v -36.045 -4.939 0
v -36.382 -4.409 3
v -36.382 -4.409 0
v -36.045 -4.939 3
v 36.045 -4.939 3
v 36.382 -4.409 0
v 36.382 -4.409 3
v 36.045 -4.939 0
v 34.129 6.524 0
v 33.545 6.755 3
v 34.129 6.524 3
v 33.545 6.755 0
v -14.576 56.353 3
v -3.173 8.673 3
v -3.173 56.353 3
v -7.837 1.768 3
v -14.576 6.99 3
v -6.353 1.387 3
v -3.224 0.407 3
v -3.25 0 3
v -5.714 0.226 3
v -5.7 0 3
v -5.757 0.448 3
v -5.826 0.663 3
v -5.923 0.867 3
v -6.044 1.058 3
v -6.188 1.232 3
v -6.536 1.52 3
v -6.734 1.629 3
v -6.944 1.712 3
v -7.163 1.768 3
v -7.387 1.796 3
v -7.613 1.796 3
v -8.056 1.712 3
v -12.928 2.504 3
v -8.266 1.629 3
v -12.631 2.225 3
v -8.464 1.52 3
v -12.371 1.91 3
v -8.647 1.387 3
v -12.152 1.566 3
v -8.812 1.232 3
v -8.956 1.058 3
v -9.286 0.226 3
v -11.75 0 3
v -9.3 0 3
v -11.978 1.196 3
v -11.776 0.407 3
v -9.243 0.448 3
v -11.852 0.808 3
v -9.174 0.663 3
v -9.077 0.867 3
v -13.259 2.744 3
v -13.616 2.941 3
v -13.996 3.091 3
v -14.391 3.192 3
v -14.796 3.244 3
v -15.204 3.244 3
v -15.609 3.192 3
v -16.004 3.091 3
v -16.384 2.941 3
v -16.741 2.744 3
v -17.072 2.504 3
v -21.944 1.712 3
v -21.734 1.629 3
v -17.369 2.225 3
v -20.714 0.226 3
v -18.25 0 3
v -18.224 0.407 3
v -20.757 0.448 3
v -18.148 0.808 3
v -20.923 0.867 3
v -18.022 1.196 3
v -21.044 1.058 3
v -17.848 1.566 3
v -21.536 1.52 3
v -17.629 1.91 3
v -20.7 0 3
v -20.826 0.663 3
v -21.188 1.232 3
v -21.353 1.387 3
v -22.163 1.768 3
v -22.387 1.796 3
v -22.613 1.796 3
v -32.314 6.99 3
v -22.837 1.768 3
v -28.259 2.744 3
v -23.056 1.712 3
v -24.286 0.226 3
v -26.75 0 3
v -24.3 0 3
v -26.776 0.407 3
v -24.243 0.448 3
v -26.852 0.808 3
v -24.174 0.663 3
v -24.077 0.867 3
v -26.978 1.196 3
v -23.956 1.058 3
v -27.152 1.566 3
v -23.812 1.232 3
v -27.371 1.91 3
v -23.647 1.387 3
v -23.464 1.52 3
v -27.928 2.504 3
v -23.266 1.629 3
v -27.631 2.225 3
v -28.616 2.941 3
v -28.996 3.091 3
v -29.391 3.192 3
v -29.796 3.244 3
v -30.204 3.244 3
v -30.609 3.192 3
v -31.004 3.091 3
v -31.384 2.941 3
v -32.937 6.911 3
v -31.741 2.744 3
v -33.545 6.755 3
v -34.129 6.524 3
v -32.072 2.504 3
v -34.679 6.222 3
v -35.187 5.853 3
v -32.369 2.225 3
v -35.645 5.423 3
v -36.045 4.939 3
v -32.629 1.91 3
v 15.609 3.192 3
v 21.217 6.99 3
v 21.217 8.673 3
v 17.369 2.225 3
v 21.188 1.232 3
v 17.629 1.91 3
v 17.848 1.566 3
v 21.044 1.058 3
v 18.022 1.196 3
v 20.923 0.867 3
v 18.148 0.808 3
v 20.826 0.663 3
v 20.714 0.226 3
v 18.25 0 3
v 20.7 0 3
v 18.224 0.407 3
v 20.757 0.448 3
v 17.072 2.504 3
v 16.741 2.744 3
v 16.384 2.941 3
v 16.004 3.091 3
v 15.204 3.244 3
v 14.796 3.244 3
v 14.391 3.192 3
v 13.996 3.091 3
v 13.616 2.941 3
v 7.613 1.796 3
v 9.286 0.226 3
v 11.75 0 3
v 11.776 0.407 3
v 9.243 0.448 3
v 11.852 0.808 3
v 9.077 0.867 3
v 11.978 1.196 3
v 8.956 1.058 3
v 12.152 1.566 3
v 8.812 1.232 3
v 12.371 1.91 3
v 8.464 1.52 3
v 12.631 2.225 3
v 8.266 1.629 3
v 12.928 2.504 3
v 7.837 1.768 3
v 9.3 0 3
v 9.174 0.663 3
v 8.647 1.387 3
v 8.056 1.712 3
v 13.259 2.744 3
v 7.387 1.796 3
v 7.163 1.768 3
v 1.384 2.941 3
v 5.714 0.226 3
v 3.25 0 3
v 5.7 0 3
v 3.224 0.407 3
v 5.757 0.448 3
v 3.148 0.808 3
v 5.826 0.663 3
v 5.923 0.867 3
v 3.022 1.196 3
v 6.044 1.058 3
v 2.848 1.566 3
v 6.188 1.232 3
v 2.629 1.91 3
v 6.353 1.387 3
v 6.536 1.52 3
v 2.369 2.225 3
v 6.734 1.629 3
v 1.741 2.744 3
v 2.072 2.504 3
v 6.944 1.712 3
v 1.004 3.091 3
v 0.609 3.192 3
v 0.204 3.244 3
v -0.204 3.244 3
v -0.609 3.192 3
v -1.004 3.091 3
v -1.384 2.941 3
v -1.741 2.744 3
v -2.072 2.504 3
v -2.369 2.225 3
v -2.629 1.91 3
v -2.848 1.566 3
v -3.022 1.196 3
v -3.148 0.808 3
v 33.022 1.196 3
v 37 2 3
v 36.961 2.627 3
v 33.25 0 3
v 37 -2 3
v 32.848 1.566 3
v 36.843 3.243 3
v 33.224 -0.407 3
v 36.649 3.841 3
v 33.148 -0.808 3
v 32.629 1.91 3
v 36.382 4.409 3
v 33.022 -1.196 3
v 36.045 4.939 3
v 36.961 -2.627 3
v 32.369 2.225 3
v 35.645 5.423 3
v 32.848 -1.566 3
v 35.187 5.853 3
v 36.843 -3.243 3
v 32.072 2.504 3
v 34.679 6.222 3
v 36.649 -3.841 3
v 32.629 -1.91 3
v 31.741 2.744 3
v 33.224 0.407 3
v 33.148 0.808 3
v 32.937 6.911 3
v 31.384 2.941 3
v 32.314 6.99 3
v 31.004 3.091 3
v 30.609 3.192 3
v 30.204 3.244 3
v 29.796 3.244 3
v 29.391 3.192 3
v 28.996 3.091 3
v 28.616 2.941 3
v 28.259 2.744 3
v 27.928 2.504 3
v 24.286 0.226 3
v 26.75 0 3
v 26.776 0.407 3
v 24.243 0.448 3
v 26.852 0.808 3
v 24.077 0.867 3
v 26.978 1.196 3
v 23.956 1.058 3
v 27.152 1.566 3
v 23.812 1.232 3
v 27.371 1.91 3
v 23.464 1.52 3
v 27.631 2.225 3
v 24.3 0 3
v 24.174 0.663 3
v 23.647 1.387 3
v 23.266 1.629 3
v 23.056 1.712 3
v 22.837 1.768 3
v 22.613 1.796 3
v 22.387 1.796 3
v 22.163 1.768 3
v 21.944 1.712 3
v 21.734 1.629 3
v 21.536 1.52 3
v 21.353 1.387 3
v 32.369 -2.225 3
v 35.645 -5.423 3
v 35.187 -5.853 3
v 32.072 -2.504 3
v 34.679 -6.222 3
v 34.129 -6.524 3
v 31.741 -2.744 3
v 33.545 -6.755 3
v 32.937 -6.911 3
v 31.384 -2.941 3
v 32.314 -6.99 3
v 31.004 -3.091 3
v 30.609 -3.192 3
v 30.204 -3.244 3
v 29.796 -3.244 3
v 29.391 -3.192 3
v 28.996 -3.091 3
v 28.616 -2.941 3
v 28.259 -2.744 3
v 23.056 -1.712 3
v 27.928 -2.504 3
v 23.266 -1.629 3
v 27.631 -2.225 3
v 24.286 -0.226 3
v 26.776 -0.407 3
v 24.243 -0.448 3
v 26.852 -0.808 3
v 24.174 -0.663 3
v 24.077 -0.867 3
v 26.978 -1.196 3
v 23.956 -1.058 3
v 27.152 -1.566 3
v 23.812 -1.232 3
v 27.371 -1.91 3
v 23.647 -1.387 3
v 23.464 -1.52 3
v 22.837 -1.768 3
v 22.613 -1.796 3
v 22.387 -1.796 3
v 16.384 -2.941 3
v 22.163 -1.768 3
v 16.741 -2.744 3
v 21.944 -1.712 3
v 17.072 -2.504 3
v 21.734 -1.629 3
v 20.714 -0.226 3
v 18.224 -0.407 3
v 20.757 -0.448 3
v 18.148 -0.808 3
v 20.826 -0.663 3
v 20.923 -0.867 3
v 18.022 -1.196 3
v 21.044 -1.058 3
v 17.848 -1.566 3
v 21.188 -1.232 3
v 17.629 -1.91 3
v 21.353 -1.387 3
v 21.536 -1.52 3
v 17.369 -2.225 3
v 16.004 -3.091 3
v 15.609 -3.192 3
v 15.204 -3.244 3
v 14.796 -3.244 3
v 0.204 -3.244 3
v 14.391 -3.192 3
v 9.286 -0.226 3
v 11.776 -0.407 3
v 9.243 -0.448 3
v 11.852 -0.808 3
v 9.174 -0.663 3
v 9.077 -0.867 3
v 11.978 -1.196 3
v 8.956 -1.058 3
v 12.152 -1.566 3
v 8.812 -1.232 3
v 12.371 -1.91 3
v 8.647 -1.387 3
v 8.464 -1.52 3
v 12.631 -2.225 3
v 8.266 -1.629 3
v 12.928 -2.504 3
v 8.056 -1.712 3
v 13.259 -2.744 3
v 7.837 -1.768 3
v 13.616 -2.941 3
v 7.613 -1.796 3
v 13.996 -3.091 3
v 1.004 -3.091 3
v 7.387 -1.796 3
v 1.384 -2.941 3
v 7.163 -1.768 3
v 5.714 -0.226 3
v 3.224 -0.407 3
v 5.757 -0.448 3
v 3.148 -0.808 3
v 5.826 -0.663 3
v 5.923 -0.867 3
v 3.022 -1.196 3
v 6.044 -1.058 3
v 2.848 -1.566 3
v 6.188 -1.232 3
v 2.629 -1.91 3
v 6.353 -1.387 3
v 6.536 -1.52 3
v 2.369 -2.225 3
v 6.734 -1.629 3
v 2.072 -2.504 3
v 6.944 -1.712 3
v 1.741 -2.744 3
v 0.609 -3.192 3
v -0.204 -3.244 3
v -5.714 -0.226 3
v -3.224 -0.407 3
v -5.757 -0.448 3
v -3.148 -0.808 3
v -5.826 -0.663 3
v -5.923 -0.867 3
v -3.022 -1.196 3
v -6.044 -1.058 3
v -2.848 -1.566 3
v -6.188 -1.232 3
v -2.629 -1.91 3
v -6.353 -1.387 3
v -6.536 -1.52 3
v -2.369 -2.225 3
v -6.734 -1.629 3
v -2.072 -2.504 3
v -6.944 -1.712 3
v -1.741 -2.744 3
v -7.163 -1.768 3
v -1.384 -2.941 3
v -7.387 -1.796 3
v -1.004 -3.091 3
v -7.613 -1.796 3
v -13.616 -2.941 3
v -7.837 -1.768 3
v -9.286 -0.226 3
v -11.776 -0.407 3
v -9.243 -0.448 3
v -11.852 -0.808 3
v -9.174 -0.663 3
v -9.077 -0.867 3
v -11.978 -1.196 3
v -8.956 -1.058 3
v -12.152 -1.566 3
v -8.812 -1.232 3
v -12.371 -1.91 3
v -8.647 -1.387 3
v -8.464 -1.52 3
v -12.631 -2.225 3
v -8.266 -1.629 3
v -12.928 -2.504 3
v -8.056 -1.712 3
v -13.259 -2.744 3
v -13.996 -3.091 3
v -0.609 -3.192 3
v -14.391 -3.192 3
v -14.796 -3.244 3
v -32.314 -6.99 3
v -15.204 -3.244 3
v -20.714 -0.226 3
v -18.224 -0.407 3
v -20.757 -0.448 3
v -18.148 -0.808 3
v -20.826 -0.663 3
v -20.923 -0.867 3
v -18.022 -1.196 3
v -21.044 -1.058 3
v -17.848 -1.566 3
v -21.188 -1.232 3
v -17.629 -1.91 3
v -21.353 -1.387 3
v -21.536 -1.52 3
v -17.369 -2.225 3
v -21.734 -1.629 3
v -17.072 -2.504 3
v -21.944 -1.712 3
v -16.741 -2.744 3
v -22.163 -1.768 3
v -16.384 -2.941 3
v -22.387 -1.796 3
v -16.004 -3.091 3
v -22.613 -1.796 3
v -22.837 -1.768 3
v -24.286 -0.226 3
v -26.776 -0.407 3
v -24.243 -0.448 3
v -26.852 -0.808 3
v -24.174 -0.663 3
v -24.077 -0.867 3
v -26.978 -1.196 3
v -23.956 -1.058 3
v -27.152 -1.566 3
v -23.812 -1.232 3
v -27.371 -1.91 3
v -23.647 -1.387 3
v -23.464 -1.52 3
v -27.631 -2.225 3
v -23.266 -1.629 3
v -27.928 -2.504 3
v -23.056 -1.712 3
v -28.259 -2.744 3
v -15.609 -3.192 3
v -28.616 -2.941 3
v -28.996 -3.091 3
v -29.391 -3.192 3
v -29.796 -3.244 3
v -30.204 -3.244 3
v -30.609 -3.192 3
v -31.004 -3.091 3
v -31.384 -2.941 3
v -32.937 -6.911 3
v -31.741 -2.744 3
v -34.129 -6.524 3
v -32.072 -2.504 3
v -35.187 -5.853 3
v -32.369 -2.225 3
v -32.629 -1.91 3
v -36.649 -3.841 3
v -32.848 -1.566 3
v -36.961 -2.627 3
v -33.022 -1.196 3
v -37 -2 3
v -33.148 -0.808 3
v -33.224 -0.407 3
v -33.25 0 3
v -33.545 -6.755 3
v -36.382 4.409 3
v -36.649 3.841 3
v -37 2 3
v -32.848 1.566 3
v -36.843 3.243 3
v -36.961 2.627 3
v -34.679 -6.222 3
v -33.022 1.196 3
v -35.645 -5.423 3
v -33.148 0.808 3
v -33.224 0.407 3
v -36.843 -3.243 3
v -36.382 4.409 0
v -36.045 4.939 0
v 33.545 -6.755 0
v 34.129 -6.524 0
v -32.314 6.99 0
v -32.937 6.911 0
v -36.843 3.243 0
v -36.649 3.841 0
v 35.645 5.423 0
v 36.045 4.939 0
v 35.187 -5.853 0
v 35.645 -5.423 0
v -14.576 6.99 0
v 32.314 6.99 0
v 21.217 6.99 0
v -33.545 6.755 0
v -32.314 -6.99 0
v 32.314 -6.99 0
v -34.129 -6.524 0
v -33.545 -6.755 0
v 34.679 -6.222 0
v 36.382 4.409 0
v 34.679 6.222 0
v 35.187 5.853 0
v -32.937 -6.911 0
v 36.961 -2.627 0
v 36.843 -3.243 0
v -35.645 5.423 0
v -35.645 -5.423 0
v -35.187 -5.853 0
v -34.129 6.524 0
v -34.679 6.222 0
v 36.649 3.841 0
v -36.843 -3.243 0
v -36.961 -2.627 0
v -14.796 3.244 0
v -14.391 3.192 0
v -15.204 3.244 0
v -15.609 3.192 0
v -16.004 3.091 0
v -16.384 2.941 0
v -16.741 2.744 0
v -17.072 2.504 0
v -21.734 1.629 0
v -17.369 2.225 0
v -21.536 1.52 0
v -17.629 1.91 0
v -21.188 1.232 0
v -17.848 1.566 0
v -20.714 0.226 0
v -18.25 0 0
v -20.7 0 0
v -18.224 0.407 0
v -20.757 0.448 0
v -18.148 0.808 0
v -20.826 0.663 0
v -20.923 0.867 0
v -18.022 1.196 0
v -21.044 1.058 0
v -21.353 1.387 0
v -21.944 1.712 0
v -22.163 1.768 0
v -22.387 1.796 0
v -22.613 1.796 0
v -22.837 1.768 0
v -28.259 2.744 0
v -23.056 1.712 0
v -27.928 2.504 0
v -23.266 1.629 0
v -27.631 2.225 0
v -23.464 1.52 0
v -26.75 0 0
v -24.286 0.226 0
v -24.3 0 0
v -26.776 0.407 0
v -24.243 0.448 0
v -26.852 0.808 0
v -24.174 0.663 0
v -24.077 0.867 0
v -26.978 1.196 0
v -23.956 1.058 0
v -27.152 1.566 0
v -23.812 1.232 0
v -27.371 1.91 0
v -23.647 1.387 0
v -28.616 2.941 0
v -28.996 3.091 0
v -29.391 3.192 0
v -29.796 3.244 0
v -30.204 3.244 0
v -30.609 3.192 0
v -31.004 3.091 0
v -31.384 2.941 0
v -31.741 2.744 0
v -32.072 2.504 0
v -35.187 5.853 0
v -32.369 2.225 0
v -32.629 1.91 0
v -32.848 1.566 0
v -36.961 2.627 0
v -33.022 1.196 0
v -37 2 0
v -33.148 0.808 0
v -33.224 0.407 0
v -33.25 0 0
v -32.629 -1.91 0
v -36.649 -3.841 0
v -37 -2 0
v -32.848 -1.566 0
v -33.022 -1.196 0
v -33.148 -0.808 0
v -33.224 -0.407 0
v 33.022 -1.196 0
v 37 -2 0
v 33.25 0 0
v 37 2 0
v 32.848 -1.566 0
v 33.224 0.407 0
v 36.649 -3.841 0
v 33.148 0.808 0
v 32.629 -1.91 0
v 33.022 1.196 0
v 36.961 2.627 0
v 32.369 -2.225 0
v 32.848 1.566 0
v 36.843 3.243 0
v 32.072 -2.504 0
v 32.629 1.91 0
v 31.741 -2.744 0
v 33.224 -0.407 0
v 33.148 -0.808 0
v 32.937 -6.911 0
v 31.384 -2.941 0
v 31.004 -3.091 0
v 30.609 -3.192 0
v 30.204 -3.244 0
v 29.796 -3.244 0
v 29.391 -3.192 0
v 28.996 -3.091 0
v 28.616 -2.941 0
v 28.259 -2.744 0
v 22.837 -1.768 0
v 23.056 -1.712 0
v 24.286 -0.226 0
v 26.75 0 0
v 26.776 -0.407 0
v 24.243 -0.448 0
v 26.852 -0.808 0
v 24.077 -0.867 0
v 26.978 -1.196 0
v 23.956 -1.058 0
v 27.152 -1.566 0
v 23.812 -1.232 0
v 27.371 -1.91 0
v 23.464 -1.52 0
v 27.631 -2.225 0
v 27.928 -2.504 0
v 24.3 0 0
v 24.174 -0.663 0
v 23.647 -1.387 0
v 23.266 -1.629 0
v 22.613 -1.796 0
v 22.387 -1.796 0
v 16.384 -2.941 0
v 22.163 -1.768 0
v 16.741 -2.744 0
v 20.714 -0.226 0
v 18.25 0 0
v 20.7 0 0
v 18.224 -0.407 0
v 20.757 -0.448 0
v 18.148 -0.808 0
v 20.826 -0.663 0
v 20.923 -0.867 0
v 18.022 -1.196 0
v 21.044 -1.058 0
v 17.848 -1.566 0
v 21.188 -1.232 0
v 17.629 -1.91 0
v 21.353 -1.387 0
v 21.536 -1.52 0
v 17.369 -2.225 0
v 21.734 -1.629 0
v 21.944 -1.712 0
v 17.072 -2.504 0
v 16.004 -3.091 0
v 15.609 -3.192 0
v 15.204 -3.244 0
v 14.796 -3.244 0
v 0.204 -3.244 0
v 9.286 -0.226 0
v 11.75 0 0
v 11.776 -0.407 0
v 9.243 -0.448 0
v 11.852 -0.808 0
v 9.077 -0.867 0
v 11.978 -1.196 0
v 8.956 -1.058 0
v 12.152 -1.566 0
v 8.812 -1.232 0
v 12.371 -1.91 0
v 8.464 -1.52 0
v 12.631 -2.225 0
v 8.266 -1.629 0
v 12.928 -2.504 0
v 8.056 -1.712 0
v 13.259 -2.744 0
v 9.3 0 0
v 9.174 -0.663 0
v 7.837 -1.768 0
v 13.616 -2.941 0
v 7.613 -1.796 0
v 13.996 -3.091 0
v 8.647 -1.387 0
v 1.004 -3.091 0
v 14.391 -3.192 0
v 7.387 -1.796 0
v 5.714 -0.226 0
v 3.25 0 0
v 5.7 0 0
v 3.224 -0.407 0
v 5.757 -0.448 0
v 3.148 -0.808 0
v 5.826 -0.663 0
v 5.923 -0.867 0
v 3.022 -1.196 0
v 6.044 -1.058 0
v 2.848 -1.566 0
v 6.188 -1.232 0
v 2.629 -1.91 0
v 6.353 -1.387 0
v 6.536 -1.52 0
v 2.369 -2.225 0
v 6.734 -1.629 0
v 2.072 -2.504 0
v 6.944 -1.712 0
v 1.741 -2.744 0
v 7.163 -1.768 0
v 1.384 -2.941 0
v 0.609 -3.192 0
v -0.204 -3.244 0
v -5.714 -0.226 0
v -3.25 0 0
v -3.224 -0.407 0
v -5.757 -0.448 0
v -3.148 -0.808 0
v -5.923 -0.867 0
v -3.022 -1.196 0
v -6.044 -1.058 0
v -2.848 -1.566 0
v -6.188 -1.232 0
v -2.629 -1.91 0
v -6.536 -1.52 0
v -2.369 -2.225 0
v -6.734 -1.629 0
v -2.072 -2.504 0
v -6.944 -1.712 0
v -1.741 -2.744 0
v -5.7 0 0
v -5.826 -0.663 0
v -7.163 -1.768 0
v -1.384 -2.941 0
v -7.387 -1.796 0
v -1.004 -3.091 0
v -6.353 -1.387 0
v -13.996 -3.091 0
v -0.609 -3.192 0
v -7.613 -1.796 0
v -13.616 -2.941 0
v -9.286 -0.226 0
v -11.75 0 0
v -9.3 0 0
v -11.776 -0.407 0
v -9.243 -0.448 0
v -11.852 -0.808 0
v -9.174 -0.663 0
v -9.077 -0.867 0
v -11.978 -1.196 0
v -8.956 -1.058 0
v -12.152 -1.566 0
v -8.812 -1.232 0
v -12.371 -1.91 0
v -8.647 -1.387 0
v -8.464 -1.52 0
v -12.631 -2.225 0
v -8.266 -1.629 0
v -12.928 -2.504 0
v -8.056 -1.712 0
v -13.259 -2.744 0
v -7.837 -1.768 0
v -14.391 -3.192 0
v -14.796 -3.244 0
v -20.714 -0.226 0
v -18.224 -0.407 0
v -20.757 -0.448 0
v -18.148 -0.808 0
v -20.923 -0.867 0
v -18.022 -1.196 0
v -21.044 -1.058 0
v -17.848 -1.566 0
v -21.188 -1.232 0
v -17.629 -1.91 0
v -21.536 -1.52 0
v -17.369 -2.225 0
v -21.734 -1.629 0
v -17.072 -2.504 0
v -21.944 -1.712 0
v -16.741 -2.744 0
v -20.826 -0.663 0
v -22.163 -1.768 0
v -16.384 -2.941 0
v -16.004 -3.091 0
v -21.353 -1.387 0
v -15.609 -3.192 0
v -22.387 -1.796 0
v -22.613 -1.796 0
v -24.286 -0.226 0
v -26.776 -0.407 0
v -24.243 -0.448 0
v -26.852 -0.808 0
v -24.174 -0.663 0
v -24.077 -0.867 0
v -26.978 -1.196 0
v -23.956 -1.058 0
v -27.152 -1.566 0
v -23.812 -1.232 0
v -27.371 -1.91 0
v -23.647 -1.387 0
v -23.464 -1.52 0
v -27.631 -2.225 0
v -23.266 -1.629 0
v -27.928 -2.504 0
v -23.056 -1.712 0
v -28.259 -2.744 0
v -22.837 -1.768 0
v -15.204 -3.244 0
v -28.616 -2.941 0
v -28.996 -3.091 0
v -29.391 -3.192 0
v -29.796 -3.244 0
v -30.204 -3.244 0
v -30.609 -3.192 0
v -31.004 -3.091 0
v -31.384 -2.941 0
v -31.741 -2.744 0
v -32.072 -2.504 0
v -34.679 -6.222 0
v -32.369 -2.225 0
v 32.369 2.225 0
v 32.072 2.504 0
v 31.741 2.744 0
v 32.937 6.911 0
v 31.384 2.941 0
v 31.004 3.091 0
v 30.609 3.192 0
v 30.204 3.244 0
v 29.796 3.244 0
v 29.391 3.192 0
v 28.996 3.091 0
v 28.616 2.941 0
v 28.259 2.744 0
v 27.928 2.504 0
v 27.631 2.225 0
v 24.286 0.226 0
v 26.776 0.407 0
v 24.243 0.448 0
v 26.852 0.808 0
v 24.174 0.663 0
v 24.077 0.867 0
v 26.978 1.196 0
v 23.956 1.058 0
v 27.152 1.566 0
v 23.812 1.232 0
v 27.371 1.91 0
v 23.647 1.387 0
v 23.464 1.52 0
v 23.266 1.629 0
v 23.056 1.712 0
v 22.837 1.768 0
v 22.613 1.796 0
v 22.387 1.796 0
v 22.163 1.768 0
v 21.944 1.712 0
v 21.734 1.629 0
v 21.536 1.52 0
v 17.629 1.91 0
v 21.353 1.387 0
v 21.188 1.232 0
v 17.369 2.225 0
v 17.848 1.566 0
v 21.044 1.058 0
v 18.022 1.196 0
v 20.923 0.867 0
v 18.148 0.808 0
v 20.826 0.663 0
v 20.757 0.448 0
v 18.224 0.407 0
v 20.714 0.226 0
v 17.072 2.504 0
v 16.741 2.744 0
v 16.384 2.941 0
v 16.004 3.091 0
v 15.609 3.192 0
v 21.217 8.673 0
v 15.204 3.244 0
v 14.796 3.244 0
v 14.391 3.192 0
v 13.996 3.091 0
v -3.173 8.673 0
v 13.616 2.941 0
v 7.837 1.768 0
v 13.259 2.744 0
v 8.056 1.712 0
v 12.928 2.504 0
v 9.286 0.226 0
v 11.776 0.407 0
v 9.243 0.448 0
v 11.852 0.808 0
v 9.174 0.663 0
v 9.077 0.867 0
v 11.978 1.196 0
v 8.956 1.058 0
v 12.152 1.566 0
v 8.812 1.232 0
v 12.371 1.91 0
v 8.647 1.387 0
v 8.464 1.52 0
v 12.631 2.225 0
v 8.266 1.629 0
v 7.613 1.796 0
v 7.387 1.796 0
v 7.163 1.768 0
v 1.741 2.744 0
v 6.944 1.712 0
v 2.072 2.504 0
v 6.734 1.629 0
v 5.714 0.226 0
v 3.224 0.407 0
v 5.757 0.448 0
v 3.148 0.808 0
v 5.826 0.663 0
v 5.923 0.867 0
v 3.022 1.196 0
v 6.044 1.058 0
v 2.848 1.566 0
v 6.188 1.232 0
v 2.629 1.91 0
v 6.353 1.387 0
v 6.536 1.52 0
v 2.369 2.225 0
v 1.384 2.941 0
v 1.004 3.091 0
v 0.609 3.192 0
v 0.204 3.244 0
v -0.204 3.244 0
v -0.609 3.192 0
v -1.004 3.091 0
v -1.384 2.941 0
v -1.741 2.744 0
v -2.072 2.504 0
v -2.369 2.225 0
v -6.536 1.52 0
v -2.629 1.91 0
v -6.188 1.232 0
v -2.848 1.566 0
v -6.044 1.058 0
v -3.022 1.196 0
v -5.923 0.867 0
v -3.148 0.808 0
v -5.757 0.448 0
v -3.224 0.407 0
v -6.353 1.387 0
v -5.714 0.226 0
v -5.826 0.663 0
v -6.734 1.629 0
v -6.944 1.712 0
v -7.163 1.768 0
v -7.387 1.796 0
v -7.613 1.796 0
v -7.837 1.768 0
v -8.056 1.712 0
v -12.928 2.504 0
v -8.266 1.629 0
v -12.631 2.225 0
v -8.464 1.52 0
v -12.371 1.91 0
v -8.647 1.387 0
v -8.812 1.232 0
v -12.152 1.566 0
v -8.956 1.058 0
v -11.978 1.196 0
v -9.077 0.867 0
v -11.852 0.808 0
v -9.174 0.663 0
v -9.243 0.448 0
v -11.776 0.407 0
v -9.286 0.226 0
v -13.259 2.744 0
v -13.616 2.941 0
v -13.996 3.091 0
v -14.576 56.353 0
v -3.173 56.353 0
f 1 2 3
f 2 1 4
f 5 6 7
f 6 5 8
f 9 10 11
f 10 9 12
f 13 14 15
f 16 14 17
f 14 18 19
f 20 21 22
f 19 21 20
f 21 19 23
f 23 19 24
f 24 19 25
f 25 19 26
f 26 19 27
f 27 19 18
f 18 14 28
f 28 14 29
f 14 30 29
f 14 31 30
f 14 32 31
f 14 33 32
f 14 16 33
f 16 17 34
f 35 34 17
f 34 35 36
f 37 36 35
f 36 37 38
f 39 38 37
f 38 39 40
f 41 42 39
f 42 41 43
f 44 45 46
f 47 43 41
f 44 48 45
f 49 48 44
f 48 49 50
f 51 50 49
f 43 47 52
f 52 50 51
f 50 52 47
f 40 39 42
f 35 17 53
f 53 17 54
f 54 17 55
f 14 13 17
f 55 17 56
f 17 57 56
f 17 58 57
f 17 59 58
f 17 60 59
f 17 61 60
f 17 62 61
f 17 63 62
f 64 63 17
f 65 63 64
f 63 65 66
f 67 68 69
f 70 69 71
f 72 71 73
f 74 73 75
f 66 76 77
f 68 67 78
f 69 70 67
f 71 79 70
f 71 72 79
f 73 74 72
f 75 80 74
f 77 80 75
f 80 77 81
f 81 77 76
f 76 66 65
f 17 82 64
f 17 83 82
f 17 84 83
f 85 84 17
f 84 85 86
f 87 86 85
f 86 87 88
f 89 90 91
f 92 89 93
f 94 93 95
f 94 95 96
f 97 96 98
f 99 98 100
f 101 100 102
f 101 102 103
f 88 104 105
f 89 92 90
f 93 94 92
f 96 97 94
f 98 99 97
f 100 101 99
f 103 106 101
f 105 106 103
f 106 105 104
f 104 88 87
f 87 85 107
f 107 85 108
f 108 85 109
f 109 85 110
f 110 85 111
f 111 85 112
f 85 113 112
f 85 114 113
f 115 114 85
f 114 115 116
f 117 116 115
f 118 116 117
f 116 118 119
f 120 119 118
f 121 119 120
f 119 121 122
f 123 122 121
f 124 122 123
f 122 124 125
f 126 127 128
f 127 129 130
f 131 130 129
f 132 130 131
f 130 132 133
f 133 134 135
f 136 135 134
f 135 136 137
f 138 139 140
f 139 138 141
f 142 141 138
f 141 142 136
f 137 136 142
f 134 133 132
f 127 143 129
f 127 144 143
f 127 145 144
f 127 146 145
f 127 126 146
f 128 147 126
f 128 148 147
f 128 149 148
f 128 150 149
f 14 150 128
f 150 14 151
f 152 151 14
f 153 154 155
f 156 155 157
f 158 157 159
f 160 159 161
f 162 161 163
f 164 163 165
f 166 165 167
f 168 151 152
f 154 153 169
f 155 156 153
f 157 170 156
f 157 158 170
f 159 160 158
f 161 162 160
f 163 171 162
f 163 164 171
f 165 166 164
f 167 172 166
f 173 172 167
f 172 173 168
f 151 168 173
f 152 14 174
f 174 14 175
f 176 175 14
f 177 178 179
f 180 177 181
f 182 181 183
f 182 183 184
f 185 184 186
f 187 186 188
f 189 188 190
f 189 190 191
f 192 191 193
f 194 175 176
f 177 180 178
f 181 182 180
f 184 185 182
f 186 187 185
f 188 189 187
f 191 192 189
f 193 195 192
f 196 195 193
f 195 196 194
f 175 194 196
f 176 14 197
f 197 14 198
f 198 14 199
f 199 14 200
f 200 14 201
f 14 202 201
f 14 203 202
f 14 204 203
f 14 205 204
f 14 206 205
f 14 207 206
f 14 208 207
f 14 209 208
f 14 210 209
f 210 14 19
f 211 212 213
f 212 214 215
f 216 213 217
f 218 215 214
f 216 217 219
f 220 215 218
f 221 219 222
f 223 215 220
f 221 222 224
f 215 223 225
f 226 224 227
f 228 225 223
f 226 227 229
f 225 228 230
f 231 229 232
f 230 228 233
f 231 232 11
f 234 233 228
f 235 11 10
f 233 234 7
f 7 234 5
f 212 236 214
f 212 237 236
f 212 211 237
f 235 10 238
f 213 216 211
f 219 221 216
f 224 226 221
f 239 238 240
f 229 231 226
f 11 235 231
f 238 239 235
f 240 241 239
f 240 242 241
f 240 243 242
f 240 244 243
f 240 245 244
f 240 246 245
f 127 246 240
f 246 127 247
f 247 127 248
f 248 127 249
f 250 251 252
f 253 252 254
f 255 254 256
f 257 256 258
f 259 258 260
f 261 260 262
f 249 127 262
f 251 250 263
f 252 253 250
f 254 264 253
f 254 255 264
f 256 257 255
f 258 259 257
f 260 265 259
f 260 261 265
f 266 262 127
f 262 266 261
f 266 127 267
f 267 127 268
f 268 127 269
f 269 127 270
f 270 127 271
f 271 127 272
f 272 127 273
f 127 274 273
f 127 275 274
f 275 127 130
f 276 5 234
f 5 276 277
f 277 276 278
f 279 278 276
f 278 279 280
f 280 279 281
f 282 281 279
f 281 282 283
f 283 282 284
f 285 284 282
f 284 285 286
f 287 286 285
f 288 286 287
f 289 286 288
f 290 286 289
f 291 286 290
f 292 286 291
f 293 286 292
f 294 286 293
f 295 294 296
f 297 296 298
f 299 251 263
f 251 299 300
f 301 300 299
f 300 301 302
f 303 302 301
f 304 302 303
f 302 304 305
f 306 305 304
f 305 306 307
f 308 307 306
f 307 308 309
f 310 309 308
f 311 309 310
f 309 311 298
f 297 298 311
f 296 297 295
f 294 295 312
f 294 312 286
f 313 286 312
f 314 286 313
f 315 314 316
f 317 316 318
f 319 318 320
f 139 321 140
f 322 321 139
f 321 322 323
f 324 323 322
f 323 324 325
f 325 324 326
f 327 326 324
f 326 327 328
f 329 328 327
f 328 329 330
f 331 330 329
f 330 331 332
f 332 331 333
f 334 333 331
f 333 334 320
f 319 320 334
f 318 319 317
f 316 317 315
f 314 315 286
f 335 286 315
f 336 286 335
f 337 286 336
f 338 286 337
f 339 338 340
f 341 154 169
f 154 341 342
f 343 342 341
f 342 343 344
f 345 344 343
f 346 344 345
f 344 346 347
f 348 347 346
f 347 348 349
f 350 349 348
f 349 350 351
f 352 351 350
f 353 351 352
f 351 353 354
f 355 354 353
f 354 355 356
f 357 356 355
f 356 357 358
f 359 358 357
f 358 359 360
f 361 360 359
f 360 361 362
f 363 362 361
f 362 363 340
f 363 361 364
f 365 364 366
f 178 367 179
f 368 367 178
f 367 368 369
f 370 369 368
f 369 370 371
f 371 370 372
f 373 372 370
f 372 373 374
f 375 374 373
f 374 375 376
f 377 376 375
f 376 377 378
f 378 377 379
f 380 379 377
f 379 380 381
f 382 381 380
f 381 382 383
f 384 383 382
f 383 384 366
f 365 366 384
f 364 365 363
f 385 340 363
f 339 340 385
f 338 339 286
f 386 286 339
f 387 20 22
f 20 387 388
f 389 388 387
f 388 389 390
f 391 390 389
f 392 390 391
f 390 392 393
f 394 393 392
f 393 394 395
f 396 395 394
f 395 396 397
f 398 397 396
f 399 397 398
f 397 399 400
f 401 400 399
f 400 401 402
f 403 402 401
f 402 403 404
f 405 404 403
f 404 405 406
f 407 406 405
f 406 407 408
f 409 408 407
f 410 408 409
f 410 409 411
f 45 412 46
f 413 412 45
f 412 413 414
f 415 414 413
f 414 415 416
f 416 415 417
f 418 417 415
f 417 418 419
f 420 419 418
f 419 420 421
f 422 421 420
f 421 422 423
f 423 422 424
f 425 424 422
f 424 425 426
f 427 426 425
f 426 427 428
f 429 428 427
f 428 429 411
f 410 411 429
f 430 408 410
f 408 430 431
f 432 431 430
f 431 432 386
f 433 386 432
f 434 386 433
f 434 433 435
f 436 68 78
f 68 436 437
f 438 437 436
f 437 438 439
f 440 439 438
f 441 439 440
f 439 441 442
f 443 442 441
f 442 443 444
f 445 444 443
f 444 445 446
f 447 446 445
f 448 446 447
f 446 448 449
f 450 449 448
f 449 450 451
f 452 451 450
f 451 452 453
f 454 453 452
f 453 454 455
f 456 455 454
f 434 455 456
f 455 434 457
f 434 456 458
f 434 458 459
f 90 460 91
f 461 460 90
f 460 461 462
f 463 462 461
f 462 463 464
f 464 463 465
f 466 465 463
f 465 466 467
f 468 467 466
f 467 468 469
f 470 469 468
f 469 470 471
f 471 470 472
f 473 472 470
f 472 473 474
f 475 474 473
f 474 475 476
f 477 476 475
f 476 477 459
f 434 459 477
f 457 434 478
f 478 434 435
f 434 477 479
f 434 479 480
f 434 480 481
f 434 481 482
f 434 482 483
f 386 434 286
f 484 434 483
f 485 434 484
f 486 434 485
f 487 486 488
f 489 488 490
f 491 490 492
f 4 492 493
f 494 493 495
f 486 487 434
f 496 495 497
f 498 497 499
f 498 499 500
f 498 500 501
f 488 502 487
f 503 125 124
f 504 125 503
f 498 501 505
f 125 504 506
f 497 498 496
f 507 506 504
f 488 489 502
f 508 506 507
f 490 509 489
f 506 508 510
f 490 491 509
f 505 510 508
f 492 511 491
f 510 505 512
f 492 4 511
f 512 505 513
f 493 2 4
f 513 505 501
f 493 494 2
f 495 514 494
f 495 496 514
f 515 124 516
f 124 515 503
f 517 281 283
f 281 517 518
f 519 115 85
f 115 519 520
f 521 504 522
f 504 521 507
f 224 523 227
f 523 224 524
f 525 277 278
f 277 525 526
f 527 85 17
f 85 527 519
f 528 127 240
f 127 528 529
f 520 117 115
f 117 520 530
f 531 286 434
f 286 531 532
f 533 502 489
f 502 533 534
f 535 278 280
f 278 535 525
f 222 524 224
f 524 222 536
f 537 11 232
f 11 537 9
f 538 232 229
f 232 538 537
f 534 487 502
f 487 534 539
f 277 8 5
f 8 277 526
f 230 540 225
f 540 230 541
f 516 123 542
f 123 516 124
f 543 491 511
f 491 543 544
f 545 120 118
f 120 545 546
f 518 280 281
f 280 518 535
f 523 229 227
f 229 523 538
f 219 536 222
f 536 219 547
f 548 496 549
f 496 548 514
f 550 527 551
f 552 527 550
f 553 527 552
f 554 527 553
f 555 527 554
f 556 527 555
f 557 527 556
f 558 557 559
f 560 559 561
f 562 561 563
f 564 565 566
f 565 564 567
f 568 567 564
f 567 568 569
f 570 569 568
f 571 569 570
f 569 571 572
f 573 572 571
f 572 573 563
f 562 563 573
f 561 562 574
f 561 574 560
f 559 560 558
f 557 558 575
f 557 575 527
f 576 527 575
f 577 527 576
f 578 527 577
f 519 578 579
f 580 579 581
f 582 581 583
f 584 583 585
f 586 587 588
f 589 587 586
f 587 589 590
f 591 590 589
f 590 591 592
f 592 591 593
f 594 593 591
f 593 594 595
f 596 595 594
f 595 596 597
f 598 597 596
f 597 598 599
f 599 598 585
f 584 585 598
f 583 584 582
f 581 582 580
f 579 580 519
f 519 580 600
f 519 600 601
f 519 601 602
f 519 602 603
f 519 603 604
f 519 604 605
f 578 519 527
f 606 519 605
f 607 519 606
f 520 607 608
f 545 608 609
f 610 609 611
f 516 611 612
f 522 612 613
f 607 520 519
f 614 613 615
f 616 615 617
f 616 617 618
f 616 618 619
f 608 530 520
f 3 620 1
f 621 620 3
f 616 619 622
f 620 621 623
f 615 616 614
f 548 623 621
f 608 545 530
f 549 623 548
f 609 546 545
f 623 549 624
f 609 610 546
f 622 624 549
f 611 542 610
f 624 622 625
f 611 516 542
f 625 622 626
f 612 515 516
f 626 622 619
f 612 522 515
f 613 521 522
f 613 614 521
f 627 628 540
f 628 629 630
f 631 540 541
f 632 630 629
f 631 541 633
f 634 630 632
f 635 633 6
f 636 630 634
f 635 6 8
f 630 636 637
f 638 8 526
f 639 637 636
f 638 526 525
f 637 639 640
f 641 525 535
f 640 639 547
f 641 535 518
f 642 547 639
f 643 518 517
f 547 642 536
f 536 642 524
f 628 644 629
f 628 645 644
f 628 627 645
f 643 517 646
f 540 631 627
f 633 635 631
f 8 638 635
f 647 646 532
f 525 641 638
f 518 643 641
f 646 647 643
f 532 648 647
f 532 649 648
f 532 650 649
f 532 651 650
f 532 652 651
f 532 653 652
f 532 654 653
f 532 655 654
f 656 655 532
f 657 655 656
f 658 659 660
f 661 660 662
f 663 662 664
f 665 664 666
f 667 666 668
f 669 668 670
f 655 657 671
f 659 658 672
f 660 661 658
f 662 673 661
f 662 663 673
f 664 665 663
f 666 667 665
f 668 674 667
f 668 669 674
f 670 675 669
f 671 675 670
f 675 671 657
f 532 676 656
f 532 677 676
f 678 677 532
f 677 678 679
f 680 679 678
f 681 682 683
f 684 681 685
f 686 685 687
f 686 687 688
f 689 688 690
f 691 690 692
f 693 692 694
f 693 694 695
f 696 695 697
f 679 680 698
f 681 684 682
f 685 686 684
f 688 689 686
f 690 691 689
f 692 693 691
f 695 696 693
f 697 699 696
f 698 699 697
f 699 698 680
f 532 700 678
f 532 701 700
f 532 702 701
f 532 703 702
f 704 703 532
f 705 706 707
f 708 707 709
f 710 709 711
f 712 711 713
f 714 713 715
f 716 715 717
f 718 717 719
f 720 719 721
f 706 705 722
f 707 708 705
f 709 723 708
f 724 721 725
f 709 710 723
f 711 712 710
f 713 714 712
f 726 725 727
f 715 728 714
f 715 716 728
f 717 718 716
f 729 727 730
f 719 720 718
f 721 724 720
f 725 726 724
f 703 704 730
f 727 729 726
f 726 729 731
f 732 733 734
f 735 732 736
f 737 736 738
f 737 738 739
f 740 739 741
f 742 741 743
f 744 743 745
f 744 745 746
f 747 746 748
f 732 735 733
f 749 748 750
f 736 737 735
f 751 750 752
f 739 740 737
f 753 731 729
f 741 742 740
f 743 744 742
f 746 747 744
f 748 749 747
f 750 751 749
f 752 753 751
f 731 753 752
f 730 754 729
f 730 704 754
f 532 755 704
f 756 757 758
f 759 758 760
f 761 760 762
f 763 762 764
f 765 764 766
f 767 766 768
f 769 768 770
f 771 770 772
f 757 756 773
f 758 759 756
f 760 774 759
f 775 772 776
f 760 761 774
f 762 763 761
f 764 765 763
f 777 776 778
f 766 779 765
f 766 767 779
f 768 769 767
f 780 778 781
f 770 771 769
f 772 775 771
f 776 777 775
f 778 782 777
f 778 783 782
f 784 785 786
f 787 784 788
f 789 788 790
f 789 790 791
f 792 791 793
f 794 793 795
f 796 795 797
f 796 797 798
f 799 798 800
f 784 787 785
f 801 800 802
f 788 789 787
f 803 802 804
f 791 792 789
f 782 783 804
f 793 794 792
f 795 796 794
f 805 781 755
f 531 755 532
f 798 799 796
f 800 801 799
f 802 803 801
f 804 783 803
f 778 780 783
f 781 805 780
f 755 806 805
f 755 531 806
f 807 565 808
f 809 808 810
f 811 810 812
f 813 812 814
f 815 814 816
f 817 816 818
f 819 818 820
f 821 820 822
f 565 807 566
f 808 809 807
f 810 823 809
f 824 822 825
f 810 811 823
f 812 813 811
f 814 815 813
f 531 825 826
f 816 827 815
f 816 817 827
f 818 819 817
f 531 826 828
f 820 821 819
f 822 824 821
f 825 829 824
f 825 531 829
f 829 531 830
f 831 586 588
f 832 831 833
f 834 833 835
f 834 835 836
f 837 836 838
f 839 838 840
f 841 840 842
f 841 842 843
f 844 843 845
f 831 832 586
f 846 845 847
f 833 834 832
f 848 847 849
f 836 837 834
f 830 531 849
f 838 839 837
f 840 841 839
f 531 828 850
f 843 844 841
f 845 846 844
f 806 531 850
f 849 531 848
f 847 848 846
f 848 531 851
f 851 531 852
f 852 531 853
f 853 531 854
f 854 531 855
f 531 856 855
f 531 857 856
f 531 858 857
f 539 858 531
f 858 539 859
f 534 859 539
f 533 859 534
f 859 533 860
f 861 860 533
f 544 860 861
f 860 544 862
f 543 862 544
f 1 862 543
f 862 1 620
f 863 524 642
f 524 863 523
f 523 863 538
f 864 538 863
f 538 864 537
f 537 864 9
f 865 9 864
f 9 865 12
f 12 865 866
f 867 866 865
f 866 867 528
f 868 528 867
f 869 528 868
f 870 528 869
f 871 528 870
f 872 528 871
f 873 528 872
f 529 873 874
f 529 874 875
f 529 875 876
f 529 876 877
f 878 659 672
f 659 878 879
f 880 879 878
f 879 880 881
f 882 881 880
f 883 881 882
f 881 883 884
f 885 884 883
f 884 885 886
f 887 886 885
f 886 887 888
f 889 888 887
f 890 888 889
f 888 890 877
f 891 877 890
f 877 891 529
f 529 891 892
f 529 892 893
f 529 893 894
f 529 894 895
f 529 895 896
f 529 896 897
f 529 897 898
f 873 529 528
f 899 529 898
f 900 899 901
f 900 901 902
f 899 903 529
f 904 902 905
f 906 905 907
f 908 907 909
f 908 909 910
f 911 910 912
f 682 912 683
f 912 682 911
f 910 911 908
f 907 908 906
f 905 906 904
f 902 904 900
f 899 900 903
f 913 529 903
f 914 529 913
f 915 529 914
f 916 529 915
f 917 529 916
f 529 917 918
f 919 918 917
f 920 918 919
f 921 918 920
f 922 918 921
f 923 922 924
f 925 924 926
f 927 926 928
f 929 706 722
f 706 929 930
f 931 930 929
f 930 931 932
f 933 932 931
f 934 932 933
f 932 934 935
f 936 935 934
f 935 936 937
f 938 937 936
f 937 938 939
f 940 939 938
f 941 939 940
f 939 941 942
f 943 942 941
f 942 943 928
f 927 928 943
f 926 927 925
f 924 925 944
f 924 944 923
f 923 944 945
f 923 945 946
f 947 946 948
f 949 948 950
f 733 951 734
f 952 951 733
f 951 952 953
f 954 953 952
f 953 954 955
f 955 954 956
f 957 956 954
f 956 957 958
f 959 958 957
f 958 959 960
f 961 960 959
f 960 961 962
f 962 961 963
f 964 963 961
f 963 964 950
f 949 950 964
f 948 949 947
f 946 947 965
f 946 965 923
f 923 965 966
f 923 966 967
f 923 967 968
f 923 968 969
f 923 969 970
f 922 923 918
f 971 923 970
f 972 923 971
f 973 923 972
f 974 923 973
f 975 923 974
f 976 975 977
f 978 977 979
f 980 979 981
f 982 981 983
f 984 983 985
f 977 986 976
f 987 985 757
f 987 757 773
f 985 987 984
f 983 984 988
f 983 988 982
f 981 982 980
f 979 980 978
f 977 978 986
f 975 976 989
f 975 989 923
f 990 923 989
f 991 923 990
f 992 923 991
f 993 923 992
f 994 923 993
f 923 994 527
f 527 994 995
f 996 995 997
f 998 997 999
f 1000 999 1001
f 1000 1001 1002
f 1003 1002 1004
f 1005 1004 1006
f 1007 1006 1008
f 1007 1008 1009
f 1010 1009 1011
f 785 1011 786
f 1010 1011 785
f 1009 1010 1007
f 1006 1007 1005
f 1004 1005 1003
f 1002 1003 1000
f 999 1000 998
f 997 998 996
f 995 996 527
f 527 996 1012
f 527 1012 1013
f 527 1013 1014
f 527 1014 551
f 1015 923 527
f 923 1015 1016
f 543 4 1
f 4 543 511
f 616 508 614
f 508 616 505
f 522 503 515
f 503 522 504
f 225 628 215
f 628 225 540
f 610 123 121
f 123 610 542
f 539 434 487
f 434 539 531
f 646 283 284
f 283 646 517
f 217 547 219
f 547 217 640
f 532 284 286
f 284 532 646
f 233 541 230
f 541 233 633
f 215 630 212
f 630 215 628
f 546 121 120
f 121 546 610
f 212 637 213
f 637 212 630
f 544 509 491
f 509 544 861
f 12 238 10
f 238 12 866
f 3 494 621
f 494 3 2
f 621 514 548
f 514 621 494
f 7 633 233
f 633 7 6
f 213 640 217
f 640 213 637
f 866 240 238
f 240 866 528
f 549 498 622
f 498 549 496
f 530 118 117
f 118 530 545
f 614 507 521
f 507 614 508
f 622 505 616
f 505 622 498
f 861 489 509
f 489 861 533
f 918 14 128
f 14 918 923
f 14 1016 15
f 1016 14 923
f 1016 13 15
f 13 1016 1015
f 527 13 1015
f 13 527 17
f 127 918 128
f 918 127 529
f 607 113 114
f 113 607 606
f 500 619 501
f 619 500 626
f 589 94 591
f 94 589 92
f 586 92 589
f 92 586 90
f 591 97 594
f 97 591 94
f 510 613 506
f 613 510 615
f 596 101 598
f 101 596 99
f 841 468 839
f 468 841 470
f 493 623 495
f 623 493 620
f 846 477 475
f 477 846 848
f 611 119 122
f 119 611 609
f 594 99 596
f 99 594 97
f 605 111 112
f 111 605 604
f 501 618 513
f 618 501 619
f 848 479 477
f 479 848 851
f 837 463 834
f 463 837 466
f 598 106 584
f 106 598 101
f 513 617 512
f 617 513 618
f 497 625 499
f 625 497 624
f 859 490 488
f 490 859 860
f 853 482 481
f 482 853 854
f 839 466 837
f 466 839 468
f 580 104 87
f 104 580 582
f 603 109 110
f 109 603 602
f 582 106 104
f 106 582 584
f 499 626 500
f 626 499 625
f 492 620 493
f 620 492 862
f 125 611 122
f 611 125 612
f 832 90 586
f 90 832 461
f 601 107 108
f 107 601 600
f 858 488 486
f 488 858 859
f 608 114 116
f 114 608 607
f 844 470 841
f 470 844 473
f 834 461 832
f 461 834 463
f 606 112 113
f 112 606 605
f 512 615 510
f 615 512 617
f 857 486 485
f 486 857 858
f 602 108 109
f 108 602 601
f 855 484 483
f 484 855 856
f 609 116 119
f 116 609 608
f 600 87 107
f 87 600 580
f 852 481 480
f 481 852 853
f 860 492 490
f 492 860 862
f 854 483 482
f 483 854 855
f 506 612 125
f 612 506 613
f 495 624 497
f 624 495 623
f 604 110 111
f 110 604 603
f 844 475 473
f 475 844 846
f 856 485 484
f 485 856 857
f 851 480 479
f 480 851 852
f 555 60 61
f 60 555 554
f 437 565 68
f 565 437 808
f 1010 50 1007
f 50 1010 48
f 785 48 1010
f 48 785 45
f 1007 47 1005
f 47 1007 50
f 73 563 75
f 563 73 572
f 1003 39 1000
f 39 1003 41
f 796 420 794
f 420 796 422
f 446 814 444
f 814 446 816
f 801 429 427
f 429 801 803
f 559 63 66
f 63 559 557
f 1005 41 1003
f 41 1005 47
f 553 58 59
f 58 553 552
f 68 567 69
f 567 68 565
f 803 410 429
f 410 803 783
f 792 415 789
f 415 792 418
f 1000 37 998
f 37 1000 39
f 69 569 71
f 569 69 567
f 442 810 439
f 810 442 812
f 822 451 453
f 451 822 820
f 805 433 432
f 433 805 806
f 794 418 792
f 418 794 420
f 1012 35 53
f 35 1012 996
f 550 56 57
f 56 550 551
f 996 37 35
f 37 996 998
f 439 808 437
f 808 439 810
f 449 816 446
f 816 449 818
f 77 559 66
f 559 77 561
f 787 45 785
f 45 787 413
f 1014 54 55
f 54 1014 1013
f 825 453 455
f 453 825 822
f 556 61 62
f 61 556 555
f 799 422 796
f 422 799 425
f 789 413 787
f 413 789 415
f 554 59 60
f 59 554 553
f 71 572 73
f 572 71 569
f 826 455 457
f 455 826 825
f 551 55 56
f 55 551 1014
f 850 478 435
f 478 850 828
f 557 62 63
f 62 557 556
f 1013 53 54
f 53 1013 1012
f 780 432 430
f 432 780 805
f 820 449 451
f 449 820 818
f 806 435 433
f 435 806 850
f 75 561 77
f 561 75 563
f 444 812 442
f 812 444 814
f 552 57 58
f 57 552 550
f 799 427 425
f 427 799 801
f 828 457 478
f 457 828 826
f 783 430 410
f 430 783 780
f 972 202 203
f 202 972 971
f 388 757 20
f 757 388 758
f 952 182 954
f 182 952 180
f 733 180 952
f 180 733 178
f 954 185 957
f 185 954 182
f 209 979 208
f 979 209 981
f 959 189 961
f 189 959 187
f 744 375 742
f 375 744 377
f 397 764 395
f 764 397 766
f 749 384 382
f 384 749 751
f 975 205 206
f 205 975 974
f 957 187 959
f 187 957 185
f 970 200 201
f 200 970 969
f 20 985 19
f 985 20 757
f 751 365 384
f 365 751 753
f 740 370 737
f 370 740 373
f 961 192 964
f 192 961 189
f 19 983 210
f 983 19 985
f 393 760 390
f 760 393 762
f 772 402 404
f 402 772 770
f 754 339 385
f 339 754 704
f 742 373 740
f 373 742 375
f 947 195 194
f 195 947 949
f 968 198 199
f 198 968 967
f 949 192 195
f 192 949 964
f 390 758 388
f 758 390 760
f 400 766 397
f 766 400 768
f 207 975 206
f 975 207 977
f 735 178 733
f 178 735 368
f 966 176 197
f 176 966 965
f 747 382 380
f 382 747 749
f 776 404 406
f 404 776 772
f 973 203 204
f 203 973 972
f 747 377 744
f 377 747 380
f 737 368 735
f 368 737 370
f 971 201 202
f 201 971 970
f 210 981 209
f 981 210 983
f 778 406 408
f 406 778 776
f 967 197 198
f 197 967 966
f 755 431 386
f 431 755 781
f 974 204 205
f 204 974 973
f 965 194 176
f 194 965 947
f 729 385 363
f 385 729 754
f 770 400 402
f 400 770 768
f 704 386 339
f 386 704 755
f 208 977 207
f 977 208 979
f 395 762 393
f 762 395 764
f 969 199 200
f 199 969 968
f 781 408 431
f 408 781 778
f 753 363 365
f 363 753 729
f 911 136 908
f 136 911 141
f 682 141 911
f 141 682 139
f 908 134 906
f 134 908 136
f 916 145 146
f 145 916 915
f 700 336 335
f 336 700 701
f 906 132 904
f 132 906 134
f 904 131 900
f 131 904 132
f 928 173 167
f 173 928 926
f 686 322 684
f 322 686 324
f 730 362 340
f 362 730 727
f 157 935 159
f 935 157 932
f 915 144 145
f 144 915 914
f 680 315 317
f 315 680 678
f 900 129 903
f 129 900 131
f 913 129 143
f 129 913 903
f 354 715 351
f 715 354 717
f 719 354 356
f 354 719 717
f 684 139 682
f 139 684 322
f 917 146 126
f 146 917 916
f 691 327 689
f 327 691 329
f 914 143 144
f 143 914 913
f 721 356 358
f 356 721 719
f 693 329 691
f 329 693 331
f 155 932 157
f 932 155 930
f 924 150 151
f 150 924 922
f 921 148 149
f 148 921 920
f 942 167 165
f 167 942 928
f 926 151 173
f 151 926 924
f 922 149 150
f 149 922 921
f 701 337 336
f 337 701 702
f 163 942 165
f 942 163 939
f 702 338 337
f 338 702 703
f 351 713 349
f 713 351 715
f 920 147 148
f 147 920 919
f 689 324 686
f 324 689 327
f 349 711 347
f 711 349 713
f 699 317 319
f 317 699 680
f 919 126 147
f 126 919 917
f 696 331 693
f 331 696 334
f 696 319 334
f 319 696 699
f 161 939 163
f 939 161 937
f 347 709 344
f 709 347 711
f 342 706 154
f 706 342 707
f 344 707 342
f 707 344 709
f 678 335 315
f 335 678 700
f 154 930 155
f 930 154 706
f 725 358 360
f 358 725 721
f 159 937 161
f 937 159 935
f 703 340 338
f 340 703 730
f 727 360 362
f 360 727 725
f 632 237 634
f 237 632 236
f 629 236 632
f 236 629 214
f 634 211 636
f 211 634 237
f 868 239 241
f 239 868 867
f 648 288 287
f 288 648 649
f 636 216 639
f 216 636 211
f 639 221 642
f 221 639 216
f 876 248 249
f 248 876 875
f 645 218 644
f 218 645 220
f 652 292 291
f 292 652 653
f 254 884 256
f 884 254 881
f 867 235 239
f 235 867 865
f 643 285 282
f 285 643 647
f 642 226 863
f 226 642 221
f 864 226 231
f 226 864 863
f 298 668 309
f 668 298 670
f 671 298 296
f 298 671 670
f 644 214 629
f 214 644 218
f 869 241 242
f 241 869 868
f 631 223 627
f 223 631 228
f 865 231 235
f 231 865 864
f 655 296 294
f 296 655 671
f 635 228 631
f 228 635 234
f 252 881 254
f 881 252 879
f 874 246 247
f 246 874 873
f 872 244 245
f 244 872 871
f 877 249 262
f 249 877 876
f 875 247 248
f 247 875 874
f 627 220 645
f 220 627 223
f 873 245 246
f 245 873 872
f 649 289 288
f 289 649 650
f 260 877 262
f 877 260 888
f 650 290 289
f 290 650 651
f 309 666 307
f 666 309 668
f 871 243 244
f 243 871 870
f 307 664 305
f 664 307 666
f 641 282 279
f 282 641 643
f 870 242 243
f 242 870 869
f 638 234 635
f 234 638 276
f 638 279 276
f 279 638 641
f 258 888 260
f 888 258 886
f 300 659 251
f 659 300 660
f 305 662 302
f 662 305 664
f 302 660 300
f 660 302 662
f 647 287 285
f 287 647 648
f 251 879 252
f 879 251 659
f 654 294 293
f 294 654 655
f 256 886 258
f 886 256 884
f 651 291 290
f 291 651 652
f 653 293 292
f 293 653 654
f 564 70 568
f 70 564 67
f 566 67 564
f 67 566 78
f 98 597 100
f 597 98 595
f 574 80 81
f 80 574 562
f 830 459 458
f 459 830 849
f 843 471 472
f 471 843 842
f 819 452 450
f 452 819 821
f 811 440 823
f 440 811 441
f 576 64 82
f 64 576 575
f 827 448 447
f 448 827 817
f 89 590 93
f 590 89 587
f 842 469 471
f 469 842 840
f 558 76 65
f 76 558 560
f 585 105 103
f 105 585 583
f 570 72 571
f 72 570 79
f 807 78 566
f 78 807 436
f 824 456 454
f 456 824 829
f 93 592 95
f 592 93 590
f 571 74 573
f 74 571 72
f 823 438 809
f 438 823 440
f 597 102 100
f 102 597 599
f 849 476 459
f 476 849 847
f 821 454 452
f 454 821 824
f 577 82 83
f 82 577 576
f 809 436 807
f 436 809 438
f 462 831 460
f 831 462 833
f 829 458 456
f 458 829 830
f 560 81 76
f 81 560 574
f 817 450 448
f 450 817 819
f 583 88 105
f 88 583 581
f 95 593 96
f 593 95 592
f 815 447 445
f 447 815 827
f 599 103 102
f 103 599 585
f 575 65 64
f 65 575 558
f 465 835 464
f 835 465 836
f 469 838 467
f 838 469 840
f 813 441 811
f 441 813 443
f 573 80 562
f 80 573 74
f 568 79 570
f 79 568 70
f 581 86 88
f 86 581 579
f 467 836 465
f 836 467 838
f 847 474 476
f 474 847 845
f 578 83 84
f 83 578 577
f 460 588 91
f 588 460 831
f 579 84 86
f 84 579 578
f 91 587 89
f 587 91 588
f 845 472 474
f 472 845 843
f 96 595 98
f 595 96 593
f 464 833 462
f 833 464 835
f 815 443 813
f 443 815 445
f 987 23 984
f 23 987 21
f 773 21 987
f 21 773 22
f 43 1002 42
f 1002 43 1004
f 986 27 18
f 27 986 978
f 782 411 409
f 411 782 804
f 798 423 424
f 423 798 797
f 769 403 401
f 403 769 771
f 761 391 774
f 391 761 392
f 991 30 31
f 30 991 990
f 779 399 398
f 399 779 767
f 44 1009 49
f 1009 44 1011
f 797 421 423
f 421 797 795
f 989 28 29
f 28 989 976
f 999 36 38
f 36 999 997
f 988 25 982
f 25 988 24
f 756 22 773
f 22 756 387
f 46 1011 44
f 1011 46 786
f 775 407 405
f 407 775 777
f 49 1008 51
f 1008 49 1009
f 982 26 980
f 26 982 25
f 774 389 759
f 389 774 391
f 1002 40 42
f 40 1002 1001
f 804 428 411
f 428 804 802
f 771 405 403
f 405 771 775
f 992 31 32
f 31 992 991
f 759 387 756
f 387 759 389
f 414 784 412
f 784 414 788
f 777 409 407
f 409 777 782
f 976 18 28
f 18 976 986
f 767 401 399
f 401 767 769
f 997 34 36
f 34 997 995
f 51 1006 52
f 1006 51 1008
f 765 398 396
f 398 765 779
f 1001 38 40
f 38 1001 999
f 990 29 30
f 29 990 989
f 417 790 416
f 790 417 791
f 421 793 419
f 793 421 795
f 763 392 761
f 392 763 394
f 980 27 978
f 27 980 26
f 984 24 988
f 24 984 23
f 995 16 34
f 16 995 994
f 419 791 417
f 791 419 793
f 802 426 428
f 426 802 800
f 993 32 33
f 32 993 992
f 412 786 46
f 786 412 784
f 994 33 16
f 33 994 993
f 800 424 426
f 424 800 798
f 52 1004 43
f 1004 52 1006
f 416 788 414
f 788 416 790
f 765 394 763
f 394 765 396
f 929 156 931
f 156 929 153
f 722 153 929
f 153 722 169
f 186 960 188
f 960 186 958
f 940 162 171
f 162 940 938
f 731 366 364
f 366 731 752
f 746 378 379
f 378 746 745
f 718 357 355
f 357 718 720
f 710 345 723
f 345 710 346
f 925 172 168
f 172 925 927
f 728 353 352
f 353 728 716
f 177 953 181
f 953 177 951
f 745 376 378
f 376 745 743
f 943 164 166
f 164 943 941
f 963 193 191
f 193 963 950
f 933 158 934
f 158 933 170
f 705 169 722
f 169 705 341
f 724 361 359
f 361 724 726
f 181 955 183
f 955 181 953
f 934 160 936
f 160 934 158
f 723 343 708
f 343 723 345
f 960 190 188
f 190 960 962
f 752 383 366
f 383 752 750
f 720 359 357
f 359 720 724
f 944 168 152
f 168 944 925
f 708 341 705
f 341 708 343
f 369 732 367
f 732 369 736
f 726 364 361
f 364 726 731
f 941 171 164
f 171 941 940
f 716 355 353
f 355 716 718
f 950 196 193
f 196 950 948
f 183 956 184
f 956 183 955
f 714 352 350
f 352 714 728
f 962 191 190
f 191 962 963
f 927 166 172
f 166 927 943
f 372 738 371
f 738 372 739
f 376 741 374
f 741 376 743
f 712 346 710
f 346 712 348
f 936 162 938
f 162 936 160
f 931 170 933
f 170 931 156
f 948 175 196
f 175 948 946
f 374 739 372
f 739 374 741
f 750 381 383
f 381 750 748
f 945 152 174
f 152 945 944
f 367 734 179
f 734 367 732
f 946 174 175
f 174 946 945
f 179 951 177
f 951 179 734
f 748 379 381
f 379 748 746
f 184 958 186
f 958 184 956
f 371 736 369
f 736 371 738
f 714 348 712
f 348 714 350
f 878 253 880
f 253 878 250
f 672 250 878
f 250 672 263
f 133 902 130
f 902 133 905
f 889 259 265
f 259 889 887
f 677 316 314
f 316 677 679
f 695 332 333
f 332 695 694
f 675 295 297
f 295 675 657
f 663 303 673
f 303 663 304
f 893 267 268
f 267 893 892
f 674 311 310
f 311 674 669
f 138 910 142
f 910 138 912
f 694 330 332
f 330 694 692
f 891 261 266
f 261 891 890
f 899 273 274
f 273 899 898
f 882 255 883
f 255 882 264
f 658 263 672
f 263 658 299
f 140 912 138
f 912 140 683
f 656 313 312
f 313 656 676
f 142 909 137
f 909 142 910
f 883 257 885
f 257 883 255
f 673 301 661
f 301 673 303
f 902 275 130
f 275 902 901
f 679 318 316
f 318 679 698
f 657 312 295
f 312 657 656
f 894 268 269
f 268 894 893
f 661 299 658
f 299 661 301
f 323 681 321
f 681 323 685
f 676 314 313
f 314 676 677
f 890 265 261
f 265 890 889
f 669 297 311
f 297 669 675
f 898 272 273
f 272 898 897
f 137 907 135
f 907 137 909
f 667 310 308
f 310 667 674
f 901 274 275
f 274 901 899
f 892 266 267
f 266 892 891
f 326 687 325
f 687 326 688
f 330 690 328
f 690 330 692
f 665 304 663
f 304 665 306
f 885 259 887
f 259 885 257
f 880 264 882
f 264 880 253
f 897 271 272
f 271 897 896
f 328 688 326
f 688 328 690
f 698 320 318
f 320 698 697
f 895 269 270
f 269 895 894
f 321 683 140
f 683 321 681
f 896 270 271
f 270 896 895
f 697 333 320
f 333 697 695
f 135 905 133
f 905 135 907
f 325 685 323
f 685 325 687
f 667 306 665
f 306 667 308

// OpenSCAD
$fn = 50;


difference() {
	union() {
		hull() {
			translate(v = [-32.0000000000, 2.0000000000, 0]) {
				cylinder(h = 3, r = 5);
			}
			translate(v = [32.0000000000, 2.0000000000, 0]) {
				cylinder(h = 3, r = 5);
			}
			translate(v = [-32.0000000000, -2.0000000000, 0]) {
				cylinder(h = 3, r = 5);
			}
			translate(v = [32.0000000000, -2.0000000000, 0]) {
				cylinder(h = 3, r = 5);
			}
		}
		translate(v = [0, 55, 0]) {
			linear_extrude(height = 3) {
				text(font = "DejaVu Sans Mono:style=Bold", halign = "center", size = 57.0000000000, text = "L", valign = "top");
			}
		}
	}
	union() {
		translate(v = [-30.0000000000, 0.0000000000, 0]) {
			translate(v = [0, 0, -100]) {
				cylinder(h = 200, r = 3.2500000000);
			}
		}
		translate(v = [-15.0000000000, 0.0000000000, 0]) {
			translate(v = [0, 0, -100]) {
				cylinder(h = 200, r = 3.2500000000);
			}
		}
		translate(v = [0, 0, -100]) {
			cylinder(h = 200, r = 3.2500000000);
		}
		translate(v = [15.0000000000, 0.0000000000, 0]) {
			translate(v = [0, 0, -100]) {
				cylinder(h = 200, r = 3.2500000000);
			}
		}
		translate(v = [30.0000000000, 0.0000000000, 0]) {
			translate(v = [0, 0, -100]) {
				cylinder(h = 200, r = 3.2500000000);
			}
		}
		translate(v = [-30.0000000000, 0.0000000000, 0]) {
			translate(v = [0, 0, -100]) {
				cylinder(h = 200, r = 1.8000000000);
			}
		}
		translate(v = [-22.5000000000, 0.0000000000, 0]) {
			translate(v = [0, 0, -100]) {
				cylinder(h = 200, r = 1.8000000000);
			}
		}
		translate(v = [-15.0000000000, 0.0000000000, 0]) {
			translate(v = [0, 0, -100]) {
				cylinder(h = 200, r = 1.8000000000);
			}
		}
		translate(v = [-7.5000000000, 0.0000000000, 0]) {
			translate(v = [0, 0, -100]) {
				cylinder(h = 200, r = 1.8000000000);
			}
		}
		translate(v = [0, 0, -100]) {
			cylinder(h = 200, r = 1.8000000000);
		}
		translate(v = [7.5000000000, 0.0000000000, 0]) {
			translate(v = [0, 0, -100]) {
				cylinder(h = 200, r = 1.8000000000);
			}
		}
		translate(v = [15.0000000000, 0.0000000000, 0]) {
			translate(v = [0, 0, -100]) {
				cylinder(h = 200, r = 1.8000000000);
			}
		}
		translate(v = [22.5000000000, 0.0000000000, 0]) {
			translate(v = [0, 0, -100]) {
				cylinder(h = 200, r = 1.8000000000);
			}
		}
		translate(v = [30.0000000000, 0.0000000000, 0]) {
			translate(v = [0, 0, -100]) {
				cylinder(h = 200, r = 1.8000000000);
			}
		}
	}
}
